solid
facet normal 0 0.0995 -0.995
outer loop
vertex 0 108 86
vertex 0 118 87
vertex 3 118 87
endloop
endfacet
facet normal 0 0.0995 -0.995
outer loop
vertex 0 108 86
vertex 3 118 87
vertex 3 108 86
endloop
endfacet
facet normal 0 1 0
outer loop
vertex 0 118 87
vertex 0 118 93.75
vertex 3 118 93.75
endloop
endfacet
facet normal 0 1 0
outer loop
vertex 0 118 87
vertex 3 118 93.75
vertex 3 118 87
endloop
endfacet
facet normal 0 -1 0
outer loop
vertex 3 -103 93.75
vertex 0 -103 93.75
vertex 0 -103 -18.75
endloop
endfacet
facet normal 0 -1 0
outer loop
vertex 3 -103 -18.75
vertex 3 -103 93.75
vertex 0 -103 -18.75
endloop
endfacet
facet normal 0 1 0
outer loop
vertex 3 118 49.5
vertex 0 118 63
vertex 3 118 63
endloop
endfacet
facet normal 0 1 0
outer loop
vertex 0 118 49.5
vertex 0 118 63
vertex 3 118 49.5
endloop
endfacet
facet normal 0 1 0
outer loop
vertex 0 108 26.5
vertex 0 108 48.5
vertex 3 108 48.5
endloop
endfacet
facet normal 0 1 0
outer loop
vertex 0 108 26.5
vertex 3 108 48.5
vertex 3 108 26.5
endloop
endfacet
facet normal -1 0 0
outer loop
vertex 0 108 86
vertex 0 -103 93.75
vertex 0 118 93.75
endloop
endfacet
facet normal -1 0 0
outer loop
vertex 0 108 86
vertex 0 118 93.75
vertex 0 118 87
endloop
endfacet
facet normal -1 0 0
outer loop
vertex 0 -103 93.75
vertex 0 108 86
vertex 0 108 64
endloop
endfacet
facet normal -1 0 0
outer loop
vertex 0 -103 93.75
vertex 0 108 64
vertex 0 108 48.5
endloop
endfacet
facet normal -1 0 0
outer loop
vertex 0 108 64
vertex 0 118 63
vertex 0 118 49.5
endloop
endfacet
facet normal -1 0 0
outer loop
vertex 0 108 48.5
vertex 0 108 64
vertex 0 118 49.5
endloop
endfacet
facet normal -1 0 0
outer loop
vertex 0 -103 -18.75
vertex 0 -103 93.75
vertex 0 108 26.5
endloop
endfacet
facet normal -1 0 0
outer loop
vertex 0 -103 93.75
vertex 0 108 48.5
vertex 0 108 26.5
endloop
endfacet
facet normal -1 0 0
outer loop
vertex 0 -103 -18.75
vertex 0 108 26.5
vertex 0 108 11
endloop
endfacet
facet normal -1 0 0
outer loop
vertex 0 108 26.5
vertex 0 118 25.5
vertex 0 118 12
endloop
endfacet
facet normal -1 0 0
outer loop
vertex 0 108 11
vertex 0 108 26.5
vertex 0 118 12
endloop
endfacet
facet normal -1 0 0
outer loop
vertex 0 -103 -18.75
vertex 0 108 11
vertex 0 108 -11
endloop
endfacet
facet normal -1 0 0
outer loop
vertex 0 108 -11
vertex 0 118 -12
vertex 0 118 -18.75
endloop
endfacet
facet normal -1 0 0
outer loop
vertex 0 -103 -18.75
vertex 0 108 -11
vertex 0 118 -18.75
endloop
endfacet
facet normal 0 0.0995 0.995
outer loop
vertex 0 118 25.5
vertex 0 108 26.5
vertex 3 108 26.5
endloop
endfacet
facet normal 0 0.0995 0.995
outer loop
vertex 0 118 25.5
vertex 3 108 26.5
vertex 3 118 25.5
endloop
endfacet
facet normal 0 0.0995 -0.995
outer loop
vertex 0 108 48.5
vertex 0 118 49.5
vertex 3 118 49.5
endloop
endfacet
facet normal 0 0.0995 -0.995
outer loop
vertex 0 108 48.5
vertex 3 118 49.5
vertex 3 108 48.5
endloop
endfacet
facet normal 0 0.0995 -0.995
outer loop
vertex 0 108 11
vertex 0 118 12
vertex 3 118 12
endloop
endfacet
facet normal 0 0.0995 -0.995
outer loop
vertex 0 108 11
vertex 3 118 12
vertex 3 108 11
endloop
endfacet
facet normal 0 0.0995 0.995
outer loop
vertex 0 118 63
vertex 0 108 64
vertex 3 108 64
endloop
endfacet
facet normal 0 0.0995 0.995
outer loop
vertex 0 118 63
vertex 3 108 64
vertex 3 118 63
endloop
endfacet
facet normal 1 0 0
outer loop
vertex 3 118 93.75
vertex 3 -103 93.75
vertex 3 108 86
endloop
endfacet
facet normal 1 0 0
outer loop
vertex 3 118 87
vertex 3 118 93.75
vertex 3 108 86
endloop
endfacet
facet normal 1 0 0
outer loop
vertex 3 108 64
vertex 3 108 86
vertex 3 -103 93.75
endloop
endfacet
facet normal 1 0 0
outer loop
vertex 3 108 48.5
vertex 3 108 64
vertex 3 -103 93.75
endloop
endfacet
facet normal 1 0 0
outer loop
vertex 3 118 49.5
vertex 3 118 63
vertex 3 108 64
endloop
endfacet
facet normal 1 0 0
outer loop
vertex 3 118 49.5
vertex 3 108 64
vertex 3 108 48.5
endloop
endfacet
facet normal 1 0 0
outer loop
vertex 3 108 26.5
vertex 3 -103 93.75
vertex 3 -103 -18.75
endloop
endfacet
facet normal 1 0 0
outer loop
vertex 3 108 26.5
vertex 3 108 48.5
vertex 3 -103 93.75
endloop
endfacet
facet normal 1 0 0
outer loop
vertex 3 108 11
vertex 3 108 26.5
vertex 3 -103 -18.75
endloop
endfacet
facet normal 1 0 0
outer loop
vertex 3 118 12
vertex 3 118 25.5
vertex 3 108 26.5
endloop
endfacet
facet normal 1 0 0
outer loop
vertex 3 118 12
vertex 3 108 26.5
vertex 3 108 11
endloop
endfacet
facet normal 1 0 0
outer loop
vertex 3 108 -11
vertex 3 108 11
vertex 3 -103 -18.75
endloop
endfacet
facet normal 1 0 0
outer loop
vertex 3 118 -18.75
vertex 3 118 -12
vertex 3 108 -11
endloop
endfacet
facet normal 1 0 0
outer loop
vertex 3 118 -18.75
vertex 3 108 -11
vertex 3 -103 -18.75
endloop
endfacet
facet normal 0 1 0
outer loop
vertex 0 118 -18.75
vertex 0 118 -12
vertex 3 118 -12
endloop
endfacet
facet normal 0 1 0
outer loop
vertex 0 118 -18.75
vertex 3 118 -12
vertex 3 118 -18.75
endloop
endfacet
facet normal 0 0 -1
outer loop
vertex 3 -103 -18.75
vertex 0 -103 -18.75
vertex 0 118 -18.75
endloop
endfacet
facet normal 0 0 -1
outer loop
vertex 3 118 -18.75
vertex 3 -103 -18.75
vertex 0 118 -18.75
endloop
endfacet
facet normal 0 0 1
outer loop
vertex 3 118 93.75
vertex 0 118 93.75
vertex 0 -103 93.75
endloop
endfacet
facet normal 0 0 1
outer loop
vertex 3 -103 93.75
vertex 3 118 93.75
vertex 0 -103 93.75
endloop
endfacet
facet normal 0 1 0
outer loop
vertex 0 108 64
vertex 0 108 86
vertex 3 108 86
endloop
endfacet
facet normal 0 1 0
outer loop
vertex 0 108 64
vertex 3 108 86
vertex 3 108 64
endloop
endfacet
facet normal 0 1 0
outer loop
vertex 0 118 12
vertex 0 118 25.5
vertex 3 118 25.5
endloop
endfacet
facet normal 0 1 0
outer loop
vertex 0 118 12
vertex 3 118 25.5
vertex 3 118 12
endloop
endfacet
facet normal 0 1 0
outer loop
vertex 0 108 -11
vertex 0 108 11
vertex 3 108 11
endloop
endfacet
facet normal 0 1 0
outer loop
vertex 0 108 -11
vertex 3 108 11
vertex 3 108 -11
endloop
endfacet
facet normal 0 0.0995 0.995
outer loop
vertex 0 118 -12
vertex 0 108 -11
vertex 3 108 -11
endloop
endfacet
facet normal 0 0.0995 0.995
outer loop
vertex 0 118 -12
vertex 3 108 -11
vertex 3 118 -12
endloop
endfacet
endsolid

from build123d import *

# Parameters (mm, degrees)
SKETCH2_W           = 37.5
SKETCH2_H           = 206
BOSS_EXTRUDE2_DEPTH = 3
LPATTERN1_COUNT     = 3
LPATTERN1_PITCH     = 37.5


with BuildPart() as part:
    # Sketch2 → Boss-Extrude2 (new body)
    with BuildSketch(Plane(origin=(0, 0, 0), x_dir=(0, 0, -1), z_dir=(1, 0, 0))):
        Rectangle(SKETCH2_W, SKETCH2_H)
        Polygon((18.75, 118), (18.75, 103), (-18.75, 103), (-18.75, 118), (-12, 118), (-11, 108), (11, 108), (12, 118), align=None)
    boss_extrude2 = extrude(amount=BOSS_EXTRUDE2_DEPTH)

    # LPattern1: Boss-Extrude2 ×3
    with Locations(*[(0, 0, i * LPATTERN1_PITCH) for i in range(1, LPATTERN1_COUNT)]):
        add(boss_extrude2)


solid = part.part
